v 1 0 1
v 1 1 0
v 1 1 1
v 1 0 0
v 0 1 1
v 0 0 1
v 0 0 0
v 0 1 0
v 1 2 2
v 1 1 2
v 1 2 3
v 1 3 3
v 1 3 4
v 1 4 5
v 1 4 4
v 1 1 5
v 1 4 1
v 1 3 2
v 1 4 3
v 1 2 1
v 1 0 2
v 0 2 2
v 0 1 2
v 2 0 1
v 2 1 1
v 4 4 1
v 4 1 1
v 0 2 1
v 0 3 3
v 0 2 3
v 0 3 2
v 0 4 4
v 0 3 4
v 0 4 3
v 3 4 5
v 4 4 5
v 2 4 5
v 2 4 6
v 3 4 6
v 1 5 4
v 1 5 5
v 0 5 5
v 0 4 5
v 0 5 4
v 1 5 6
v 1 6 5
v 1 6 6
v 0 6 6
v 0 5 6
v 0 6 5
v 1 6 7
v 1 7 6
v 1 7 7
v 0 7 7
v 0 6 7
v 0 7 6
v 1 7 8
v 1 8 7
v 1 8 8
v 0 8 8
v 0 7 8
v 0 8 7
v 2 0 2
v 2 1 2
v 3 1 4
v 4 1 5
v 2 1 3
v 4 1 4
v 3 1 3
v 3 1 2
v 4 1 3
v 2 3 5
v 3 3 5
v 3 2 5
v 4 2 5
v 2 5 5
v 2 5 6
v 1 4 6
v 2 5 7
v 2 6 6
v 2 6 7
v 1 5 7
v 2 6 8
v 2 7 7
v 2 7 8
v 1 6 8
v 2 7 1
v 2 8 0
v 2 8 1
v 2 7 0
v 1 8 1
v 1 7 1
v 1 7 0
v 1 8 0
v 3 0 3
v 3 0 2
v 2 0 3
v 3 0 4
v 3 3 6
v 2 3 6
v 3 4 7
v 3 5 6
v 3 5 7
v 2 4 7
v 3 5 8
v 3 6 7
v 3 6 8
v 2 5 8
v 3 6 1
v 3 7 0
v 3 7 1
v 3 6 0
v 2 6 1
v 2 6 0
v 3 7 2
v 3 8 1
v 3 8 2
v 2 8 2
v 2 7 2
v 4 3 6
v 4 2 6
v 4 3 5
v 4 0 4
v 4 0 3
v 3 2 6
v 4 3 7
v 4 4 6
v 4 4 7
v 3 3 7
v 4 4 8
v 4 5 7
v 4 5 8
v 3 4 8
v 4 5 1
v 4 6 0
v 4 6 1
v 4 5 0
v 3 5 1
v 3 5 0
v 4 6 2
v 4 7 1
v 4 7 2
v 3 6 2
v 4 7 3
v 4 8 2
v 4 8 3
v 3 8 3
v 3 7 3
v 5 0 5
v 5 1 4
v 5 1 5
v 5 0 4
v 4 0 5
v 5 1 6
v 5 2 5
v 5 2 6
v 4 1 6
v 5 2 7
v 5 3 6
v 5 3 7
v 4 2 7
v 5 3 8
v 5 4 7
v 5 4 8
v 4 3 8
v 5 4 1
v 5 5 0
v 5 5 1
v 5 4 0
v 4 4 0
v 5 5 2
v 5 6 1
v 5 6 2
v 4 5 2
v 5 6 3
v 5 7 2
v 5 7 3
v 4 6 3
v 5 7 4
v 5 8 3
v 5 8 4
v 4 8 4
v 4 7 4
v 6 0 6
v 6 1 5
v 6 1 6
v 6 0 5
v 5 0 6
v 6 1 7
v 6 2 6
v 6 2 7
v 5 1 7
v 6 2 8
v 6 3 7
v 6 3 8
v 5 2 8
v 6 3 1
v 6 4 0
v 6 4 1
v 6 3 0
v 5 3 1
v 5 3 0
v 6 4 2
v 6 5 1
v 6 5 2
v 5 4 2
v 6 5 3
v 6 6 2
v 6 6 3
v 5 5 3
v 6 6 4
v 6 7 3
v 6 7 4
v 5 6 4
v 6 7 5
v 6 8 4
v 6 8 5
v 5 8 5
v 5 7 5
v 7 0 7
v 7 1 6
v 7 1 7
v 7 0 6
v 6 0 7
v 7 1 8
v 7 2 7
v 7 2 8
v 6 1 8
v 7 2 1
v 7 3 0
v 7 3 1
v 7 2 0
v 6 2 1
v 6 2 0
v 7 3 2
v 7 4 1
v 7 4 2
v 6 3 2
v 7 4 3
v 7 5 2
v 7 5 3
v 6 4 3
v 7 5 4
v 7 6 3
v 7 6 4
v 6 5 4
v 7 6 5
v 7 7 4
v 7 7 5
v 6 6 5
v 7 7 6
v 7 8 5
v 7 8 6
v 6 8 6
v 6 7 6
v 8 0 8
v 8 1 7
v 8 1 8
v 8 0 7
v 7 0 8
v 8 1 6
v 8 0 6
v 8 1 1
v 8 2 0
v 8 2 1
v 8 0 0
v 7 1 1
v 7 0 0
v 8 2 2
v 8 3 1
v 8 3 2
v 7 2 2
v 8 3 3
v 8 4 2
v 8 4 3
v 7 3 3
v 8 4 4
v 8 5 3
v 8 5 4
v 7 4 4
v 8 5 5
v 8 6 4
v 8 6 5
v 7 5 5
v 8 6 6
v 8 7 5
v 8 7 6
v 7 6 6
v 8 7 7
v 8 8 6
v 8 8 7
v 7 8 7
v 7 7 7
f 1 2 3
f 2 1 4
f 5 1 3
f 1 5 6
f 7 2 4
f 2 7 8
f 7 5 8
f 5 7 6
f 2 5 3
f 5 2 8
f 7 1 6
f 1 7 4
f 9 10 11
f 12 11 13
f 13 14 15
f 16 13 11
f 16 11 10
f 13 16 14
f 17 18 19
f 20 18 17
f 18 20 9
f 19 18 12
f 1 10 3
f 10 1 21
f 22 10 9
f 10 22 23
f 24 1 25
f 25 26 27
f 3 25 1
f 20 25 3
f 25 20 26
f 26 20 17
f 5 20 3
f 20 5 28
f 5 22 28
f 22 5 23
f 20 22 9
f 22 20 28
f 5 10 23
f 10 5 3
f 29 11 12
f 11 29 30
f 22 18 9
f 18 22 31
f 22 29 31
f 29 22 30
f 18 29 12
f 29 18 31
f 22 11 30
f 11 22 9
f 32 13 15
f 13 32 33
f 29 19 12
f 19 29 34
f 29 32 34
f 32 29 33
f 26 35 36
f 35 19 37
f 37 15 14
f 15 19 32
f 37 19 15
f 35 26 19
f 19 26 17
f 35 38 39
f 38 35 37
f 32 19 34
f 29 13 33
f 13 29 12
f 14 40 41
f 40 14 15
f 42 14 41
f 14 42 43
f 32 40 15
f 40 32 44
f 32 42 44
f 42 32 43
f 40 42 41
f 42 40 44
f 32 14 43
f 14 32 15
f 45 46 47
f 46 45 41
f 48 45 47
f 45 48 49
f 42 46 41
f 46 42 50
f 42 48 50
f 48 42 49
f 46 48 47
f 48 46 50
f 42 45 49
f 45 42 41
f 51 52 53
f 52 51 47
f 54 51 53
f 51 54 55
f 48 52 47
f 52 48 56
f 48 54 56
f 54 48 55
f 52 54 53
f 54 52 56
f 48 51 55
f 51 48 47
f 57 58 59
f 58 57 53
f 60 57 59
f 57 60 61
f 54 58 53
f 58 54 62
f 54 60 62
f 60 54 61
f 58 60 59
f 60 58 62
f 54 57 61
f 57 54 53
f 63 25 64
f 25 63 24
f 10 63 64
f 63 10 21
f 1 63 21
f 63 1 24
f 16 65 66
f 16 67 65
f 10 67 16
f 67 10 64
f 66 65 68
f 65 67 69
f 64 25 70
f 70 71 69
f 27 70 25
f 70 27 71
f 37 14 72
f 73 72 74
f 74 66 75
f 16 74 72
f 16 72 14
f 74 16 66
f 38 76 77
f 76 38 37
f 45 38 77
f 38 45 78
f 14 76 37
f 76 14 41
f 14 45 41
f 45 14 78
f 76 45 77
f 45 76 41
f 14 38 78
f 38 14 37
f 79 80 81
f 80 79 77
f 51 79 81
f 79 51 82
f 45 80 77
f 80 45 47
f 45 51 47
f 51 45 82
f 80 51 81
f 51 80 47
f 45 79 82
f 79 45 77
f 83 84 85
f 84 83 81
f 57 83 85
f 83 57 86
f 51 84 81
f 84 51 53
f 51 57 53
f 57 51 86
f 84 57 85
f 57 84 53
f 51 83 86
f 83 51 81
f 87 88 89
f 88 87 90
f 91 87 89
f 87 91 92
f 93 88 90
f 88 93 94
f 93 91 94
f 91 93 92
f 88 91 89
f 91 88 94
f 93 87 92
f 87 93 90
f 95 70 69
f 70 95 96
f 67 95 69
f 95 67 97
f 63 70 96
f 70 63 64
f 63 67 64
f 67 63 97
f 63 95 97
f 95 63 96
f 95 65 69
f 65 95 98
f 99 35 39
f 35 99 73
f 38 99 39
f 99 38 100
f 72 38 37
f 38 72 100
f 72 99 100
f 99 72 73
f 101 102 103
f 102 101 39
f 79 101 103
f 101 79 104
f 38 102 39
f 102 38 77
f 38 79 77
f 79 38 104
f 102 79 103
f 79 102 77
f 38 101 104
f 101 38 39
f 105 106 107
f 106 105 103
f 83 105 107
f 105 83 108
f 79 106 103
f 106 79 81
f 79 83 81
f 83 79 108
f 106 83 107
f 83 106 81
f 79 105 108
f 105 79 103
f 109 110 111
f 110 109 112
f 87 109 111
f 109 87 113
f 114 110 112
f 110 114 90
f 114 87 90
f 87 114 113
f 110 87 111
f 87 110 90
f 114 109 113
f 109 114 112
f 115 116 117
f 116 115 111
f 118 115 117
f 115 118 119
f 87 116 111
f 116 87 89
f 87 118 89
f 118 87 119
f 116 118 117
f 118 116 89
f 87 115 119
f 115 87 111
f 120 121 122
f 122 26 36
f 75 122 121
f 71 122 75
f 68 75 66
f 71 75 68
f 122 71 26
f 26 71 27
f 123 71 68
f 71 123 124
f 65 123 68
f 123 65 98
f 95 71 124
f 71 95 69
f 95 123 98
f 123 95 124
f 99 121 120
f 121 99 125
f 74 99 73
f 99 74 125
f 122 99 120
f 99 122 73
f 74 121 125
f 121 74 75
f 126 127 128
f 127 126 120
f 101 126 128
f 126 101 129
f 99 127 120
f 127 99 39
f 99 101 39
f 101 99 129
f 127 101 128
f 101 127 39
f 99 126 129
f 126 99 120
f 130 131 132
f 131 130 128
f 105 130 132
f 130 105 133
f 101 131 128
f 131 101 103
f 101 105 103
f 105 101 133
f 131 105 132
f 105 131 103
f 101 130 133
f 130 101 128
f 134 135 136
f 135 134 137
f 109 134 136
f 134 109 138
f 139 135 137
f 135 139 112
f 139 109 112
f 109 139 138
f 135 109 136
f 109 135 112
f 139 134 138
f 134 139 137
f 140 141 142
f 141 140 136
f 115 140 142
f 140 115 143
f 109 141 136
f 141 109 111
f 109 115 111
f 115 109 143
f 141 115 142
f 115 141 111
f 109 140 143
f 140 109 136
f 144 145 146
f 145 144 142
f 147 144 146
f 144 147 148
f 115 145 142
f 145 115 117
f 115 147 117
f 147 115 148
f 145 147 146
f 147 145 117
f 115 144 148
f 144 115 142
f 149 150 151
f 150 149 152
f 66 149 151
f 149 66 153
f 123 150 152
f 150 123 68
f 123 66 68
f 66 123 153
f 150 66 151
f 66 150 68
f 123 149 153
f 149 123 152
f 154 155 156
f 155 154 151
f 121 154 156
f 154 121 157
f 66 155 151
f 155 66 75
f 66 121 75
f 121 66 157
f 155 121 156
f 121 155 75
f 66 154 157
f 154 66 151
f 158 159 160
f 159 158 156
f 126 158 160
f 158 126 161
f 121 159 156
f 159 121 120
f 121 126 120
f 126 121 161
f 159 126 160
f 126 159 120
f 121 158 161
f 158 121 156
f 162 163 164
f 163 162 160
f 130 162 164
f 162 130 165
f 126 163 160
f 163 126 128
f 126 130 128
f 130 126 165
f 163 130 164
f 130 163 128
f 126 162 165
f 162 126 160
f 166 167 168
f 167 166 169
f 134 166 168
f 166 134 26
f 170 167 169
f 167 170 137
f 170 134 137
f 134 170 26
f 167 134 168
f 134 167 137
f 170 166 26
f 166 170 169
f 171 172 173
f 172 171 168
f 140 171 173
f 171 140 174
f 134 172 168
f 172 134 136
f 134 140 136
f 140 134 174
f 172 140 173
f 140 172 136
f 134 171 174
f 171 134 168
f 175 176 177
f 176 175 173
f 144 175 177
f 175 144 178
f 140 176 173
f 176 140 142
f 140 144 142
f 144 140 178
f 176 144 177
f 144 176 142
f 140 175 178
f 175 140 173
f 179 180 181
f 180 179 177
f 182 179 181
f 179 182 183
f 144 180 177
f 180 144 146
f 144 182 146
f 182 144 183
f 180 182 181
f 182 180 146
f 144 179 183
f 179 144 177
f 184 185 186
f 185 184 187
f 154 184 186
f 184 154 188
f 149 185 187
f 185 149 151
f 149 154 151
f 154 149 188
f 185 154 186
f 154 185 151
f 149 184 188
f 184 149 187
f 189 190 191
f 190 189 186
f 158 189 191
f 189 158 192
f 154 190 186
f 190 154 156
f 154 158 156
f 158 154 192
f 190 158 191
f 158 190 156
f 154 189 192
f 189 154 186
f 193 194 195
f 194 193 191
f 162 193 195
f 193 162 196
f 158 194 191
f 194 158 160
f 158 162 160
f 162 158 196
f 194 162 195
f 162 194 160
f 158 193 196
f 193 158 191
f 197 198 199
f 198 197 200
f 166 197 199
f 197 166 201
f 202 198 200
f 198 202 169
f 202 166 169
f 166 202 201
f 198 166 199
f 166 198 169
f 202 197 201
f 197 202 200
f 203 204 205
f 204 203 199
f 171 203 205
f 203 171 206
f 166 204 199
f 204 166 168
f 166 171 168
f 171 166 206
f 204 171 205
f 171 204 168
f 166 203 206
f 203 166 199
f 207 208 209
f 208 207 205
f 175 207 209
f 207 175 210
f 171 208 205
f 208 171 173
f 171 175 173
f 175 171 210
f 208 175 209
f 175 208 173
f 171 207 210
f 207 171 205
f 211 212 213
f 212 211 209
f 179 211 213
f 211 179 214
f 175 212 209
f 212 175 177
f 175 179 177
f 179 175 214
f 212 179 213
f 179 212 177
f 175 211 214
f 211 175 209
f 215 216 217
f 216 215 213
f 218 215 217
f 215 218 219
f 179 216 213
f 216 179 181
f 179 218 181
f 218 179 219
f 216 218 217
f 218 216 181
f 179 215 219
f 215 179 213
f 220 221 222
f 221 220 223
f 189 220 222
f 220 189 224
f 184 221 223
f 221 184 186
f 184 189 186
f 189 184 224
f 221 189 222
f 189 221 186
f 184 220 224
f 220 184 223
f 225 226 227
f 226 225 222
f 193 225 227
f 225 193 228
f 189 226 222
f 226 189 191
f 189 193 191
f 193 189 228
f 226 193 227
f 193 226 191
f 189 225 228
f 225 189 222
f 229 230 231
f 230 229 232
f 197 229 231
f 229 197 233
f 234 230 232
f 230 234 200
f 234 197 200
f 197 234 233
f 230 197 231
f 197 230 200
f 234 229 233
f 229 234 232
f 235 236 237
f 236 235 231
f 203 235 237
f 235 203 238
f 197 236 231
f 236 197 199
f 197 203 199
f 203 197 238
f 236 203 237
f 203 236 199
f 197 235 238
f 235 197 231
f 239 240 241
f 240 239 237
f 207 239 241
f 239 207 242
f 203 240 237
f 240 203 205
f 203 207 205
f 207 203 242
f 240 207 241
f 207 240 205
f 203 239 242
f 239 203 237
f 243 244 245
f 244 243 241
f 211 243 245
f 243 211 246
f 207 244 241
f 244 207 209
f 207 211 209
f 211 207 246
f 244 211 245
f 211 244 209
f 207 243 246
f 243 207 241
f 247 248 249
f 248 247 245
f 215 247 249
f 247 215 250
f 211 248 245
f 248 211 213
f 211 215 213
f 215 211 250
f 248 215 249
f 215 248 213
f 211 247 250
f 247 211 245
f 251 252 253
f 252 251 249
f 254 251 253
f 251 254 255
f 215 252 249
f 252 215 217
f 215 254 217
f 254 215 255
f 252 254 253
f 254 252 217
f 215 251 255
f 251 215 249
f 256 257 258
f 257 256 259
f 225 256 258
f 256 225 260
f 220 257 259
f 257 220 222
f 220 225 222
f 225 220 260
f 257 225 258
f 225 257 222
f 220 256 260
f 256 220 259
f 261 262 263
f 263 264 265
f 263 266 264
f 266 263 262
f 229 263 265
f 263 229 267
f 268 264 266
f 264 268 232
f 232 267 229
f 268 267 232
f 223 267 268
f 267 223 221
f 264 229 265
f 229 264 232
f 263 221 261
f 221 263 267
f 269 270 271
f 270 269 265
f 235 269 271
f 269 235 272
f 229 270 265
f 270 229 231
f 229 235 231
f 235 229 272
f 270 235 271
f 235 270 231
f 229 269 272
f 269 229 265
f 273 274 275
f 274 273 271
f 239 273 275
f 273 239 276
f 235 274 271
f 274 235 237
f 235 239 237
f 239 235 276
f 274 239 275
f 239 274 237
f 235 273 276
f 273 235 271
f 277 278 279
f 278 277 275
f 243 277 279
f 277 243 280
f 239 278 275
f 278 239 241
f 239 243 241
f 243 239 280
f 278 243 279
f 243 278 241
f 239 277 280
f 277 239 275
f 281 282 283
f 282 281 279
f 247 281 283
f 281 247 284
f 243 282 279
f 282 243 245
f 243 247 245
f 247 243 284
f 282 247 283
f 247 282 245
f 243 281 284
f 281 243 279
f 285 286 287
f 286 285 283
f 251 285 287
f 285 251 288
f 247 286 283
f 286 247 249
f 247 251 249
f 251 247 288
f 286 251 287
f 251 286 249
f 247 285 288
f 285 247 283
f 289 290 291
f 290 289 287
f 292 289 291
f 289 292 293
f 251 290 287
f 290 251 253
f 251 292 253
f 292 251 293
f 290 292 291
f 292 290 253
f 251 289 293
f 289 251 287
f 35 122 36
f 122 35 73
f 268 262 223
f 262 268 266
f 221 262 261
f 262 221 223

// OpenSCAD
union() {
    translate([0, 0, 0]) cube([1, 1, 1]);
    translate([0, 1, 1]) cube([1, 1, 1]);
    translate([0, 2, 2]) cube([1, 1, 1]);
    translate([0, 3, 3]) cube([1, 1, 1]);
    translate([0, 4, 4]) cube([1, 1, 1]);
    translate([0, 5, 5]) cube([1, 1, 1]);
    translate([0, 6, 6]) cube([1, 1, 1]);
    translate([0, 7, 7]) cube([1, 1, 1]);
    translate([1, 0, 1]) cube([1, 1, 1]);
    translate([1, 1, 2]) cube([1, 1, 1]);
    translate([1, 2, 3]) cube([1, 1, 1]);
    translate([1, 3, 4]) cube([1, 1, 1]);
    translate([1, 4, 5]) cube([1, 1, 1]);
    translate([1, 5, 6]) cube([1, 1, 1]);
    translate([1, 6, 7]) cube([1, 1, 1]);
    translate([1, 7, 0]) cube([1, 1, 1]);
    translate([2, 0, 2]) cube([1, 1, 1]);
    translate([2, 1, 3]) cube([1, 1, 1]);
    translate([2, 2, 4]) cube([1, 1, 1]);
    translate([2, 3, 5]) cube([1, 1, 1]);
    translate([2, 4, 6]) cube([1, 1, 1]);
    translate([2, 5, 7]) cube([1, 1, 1]);
    translate([2, 6, 0]) cube([1, 1, 1]);
    translate([2, 7, 1]) cube([1, 1, 1]);
    translate([3, 0, 3]) cube([1, 1, 1]);
    translate([3, 1, 4]) cube([1, 1, 1]);
    translate([3, 2, 5]) cube([1, 1, 1]);
    translate([3, 3, 6]) cube([1, 1, 1]);
    translate([3, 4, 7]) cube([1, 1, 1]);
    translate([3, 5, 0]) cube([1, 1, 1]);
    translate([3, 6, 1]) cube([1, 1, 1]);
    translate([3, 7, 2]) cube([1, 1, 1]);
    translate([4, 0, 4]) cube([1, 1, 1]);
    translate([4, 1, 5]) cube([1, 1, 1]);
    translate([4, 2, 6]) cube([1, 1, 1]);
    translate([4, 3, 7]) cube([1, 1, 1]);
    translate([4, 4, 0]) cube([1, 1, 1]);
    translate([4, 5, 1]) cube([1, 1, 1]);
    translate([4, 6, 2]) cube([1, 1, 1]);
    translate([4, 7, 3]) cube([1, 1, 1]);
    translate([5, 0, 5]) cube([1, 1, 1]);
    translate([5, 1, 6]) cube([1, 1, 1]);
    translate([5, 2, 7]) cube([1, 1, 1]);
    translate([5, 3, 0]) cube([1, 1, 1]);
    translate([5, 4, 1]) cube([1, 1, 1]);
    translate([5, 5, 2]) cube([1, 1, 1]);
    translate([5, 6, 3]) cube([1, 1, 1]);
    translate([5, 7, 4]) cube([1, 1, 1]);
    translate([6, 0, 6]) cube([1, 1, 1]);
    translate([6, 1, 7]) cube([1, 1, 1]);
    translate([6, 2, 0]) cube([1, 1, 1]);
    translate([6, 3, 1]) cube([1, 1, 1]);
    translate([6, 4, 2]) cube([1, 1, 1]);
    translate([6, 5, 3]) cube([1, 1, 1]);
    translate([6, 6, 4]) cube([1, 1, 1]);
    translate([6, 7, 5]) cube([1, 1, 1]);
    translate([7, 0, 7]) cube([1, 1, 1]);
    translate([7, 1, 0]) cube([1, 1, 1]);
    translate([7, 2, 1]) cube([1, 1, 1]);
    translate([7, 3, 2]) cube([1, 1, 1]);
    translate([7, 4, 3]) cube([1, 1, 1]);
    translate([7, 5, 4]) cube([1, 1, 1]);
    translate([7, 6, 5]) cube([1, 1, 1]);
    translate([7, 7, 6]) cube([1, 1, 1]);
    translate([1, 1, 1]) cube([1, 1, 1]);
    translate([1, 1, 3]) cube([1, 1, 1]);
    translate([1, 1, 4]) cube([1, 1, 1]);
    translate([1, 2, 1]) cube([1, 1, 1]);
    translate([1, 2, 2]) cube([1, 1, 1]);
    translate([1, 2, 4]) cube([1, 1, 1]);
    translate([1, 3, 1]) cube([1, 1, 1]);
    translate([1, 3, 2]) cube([1, 1, 1]);
    translate([1, 3, 3]) cube([1, 1, 1]);
    translate([2, 1, 1]) cube([1, 1, 1]);
    translate([2, 1, 2]) cube([1, 1, 1]);
    translate([2, 1, 4]) cube([1, 1, 1]);
    translate([2, 2, 1]) cube([1, 1, 1]);
    translate([2, 2, 2]) cube([1, 1, 1]);
    translate([2, 2, 3]) cube([1, 1, 1]);
    translate([2, 3, 1]) cube([1, 1, 1]);
    translate([2, 3, 2]) cube([1, 1, 1]);
    translate([2, 3, 3]) cube([1, 1, 1]);
    translate([2, 3, 4]) cube([1, 1, 1]);
    translate([3, 1, 1]) cube([1, 1, 1]);
    translate([3, 1, 2]) cube([1, 1, 1]);
    translate([3, 1, 3]) cube([1, 1, 1]);
    translate([3, 2, 1]) cube([1, 1, 1]);
    translate([3, 2, 2]) cube([1, 1, 1]);
    translate([3, 2, 3]) cube([1, 1, 1]);
    translate([3, 2, 4]) cube([1, 1, 1]);
    translate([3, 3, 1]) cube([1, 1, 1]);
    translate([3, 3, 2]) cube([1, 1, 1]);
    translate([3, 3, 3]) cube([1, 1, 1]);
    translate([3, 3, 4]) cube([1, 1, 1]);
    translate([7, 0, 0]) cube([1, 1, 1]);
    translate([7, 0, 1]) cube([1, 1, 1]);
    translate([7, 0, 2]) cube([1, 1, 1]);
    translate([7, 0, 3]) cube([1, 1, 1]);
    translate([7, 0, 4]) cube([1, 1, 1]);
    translate([7, 0, 5]) cube([1, 1, 1]);
}
